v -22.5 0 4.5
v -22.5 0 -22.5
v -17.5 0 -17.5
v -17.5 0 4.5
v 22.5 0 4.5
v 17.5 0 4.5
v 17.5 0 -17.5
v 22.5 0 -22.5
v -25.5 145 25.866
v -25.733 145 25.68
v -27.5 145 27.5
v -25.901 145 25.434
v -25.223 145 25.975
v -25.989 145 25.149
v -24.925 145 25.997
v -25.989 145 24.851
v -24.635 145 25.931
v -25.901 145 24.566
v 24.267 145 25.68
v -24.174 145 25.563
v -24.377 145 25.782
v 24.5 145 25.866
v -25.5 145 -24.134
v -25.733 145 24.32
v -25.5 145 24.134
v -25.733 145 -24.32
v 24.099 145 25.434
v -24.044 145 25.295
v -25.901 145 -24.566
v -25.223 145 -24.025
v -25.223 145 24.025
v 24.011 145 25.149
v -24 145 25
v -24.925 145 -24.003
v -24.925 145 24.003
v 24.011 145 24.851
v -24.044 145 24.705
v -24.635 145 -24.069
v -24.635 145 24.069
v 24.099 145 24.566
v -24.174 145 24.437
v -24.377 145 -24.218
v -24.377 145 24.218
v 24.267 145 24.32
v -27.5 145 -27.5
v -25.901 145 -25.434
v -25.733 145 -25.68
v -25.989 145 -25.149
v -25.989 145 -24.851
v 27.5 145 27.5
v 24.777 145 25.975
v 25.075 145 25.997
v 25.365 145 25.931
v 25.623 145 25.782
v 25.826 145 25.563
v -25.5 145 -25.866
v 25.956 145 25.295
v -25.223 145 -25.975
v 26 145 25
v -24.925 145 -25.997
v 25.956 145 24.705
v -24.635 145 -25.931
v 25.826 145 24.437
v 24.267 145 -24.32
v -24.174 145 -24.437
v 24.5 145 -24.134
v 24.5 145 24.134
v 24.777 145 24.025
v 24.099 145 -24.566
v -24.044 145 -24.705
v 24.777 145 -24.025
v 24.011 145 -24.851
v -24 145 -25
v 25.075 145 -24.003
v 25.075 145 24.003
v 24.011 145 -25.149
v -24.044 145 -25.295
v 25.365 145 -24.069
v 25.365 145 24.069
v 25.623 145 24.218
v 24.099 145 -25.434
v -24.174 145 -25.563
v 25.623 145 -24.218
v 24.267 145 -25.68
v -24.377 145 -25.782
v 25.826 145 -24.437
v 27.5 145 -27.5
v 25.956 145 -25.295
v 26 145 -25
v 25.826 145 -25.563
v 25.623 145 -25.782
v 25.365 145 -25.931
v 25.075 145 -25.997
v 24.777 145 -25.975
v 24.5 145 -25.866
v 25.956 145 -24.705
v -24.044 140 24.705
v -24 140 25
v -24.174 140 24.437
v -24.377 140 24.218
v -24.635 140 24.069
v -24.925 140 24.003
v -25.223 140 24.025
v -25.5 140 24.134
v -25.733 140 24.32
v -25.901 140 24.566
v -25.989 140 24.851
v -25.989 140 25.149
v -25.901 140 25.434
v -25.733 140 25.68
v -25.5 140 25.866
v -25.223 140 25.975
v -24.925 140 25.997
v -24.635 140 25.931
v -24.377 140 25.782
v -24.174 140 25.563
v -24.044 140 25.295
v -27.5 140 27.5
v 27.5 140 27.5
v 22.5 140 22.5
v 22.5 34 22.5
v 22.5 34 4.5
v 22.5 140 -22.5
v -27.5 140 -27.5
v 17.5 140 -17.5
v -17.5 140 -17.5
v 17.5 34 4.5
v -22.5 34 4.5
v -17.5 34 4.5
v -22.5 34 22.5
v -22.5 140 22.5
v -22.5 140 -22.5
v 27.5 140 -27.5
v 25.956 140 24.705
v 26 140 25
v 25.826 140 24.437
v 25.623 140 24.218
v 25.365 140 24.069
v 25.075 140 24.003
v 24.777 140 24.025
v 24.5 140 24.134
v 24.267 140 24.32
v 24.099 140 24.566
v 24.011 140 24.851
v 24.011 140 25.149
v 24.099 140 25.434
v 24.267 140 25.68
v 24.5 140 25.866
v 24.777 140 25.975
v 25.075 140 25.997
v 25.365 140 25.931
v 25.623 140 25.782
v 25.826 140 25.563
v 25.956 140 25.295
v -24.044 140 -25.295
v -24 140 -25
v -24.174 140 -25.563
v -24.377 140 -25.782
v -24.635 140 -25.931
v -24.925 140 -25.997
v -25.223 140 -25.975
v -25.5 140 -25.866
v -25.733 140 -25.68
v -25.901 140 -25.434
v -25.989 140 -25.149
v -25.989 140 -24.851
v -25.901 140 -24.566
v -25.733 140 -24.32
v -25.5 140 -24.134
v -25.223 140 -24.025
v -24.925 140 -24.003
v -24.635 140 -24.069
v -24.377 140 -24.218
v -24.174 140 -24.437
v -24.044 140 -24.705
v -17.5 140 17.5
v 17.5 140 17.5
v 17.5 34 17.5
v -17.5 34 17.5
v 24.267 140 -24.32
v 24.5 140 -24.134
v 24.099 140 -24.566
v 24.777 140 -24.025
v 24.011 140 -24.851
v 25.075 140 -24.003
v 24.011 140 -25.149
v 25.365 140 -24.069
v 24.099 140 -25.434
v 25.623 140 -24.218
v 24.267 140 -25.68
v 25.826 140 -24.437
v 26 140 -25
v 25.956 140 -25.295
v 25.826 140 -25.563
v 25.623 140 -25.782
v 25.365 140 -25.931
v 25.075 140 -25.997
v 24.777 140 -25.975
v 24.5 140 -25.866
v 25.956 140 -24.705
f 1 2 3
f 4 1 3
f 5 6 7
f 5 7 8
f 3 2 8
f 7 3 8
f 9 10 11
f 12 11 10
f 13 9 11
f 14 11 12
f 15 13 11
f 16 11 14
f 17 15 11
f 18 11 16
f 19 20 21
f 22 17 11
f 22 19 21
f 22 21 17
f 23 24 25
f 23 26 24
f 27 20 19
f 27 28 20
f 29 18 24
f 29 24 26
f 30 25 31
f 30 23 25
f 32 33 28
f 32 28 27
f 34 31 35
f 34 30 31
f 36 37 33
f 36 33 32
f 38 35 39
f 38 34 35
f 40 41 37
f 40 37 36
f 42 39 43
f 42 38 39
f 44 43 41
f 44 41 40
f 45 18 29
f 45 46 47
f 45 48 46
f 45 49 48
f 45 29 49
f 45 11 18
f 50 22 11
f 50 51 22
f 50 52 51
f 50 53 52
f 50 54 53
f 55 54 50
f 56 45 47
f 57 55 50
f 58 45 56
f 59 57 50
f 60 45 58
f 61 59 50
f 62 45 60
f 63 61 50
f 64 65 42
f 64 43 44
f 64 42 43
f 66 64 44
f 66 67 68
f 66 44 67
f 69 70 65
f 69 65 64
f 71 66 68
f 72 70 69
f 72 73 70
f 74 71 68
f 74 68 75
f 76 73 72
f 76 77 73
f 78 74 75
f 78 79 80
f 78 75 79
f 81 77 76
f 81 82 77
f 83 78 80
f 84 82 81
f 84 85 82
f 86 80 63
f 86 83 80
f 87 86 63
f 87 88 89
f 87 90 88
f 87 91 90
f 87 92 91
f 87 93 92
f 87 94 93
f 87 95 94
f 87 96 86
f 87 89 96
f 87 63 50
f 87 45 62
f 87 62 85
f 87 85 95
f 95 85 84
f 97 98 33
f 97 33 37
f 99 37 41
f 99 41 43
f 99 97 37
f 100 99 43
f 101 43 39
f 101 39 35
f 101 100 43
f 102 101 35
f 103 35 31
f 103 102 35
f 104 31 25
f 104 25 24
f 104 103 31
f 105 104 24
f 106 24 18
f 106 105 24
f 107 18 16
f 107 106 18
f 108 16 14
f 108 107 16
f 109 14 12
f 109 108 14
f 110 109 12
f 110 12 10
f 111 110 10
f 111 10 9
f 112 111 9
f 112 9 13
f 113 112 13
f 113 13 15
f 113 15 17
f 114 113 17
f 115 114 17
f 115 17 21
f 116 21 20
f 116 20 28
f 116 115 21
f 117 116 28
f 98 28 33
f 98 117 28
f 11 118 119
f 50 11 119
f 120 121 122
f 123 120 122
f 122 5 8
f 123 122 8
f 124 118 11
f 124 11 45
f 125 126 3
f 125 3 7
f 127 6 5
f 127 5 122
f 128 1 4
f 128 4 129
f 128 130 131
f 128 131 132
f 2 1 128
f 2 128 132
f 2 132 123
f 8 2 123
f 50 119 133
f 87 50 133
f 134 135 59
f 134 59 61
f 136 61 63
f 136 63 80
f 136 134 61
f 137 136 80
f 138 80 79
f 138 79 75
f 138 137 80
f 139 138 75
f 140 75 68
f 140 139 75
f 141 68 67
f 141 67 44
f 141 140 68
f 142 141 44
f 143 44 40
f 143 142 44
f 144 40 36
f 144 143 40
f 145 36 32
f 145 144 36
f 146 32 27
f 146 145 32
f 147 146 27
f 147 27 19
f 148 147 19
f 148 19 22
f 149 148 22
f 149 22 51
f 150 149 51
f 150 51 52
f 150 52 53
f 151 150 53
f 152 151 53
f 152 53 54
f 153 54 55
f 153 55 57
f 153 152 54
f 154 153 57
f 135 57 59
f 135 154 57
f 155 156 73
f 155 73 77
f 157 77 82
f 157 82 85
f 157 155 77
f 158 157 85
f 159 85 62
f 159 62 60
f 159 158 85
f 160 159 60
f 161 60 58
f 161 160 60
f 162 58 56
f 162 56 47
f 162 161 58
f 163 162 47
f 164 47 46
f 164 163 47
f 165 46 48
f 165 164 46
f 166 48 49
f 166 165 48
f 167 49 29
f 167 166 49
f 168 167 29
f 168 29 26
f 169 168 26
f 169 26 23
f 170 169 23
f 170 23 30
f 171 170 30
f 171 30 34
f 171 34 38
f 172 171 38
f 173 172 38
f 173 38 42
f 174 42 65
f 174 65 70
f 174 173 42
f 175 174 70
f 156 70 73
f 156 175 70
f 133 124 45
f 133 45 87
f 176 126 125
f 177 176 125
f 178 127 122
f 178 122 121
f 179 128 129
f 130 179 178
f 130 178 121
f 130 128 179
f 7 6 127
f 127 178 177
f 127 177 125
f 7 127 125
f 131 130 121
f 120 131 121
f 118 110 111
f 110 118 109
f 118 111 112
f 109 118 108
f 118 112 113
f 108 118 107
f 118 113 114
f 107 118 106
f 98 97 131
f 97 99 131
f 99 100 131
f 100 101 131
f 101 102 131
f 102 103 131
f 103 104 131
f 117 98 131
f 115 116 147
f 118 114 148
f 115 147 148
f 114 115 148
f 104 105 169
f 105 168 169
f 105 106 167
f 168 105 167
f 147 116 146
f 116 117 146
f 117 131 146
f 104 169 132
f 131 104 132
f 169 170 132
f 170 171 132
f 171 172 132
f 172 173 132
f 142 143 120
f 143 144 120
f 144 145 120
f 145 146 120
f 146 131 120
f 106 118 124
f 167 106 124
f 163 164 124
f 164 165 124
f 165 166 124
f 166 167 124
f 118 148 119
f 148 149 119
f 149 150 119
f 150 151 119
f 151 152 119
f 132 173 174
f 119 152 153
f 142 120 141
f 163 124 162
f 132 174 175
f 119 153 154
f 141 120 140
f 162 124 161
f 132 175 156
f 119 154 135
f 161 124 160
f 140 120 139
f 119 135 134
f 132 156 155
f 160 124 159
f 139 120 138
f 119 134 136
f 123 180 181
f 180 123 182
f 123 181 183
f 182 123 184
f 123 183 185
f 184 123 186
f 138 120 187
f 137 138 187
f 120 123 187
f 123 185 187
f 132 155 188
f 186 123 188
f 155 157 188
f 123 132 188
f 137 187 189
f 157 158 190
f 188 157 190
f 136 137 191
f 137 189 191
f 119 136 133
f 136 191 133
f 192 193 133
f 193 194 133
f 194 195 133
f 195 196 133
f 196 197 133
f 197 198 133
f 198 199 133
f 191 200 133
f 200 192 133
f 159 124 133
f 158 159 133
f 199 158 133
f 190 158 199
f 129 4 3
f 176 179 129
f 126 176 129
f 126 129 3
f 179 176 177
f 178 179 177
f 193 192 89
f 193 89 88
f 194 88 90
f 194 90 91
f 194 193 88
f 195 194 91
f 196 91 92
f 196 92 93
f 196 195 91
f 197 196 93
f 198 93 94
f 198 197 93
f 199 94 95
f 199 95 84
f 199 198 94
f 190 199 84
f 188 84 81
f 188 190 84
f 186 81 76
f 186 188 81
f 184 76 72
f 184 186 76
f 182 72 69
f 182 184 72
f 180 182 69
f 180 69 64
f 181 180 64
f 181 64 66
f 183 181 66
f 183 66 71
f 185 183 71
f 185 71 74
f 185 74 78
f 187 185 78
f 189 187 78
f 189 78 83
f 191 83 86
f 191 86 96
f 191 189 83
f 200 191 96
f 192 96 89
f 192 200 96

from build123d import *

# Parameters (mm, degrees)
CROQUIS1_W                 = 45
CROQUIS1_H                 = 45
SALIENTE_EXTRUIR1_DEPTH    = 300
CROQUIS4_W                 = 18
CROQUIS4_H                 = 34
CORTAR_EXTRUIR2_DEPTH      = 46
CROQUIS8_W                 = 35
CROQUIS8_H                 = 35
CORTAR_EXTRUIR3_DEPTH      = 301
CROQUIS9_W                 = 35
CROQUIS9_H                 = 21.174410022
CORTAR_EXTRUIR4_DEPTH      = 10
CROQUIS10_R                = 1
CORTAR_EXTRUIR5_DEPTH      = 10
CROQUIS11_W                = 45
CROQUIS11_H                = 26.387879272
CORTAR_EXTRUIR6_DEPTH      = 46
CROQUIS13_W                = 45
CROQUIS13_H                = 133.61212073
CORTAR_EXTRUIR9_DEPTH      = 23.5
CORTAR_EXTRUIR9_DEPTH_BACK = 23.5
CROQUIS14_W                = 55
CROQUIS14_H                = 55
CROQUIS14_R                = 1
SALIENTE_EXTRUIR3_DEPTH    = 5


with BuildPart() as part:
    # Croquis1 → Saliente-Extruir1 (new body)
    with BuildSketch(Plane(origin=(0, 0, 0), x_dir=(1, 0, 0), z_dir=(0, 1, 0))):
        Rectangle(CROQUIS1_W, CROQUIS1_H)
    extrude(amount=SALIENTE_EXTRUIR1_DEPTH)

    # Croquis4 → Cortar-Extruir2 (cut, through all)
    with BuildSketch(Plane.ZY.offset(22.5)):
        with Locations((13.5, 17)):
            Rectangle(CROQUIS4_W, CROQUIS4_H)
    extrude(amount=-CORTAR_EXTRUIR2_DEPTH, mode=Mode.SUBTRACT)

    # Croquis8 → Cortar-Extruir3 (cut, through all)
    with BuildSketch(Plane(origin=(0, 300, 0), x_dir=(1, 0, 0), z_dir=(0, 1, 0))):
        Rectangle(CROQUIS8_W, CROQUIS8_H)
    extrude(amount=-CORTAR_EXTRUIR3_DEPTH, mode=Mode.SUBTRACT)

    # Croquis9 → Cortar-Extruir4 (cut)
    with BuildSketch(Plane(origin=(0, 0, -22.5), x_dir=(-1, 0, 0), z_dir=(0, 0, -1))):
        with Locations((0, 260)):
            Rectangle(CROQUIS9_W, CROQUIS9_H)
    extrude(amount=-CORTAR_EXTRUIR4_DEPTH, mode=Mode.SUBTRACT)

    # Croquis10 → Cortar-Extruir5 (cut)
    with BuildSketch(Plane.XY.offset(22.5)):
        with Locations((0, 260)):
            Circle(CROQUIS10_R)
    extrude(amount=-CORTAR_EXTRUIR5_DEPTH, mode=Mode.SUBTRACT)

    # Croquis11 → Cortar-Extruir6 (cut, through all)
    with BuildSketch(Plane.XY.offset(22.5)):
        with Locations((0, 286.806060364)):
            Rectangle(CROQUIS11_W, CROQUIS11_H)
    extrude(amount=-CORTAR_EXTRUIR6_DEPTH, mode=Mode.SUBTRACT)

    # Croquis13 → Cortar-Extruir9 (cut, two sides)
    with BuildSketch(Plane(origin=(0, 0, 0), x_dir=(0, 0, -1), z_dir=(1, 0, 0))) as cortar_extruir9_sk:
        with Locations((0, 206.806060363)):
            Rectangle(CROQUIS13_W, CROQUIS13_H)
    extrude(amount=CORTAR_EXTRUIR9_DEPTH, mode=Mode.SUBTRACT)
    extrude(cortar_extruir9_sk.sketch, amount=-CORTAR_EXTRUIR9_DEPTH_BACK, mode=Mode.SUBTRACT)

    # Croquis14 → Saliente-Extruir3 (add)
    with BuildSketch(Plane(origin=(0, 139.999999998, 0), x_dir=(1, 0, 0), z_dir=(0, 1, 0))):
        Rectangle(CROQUIS14_W, CROQUIS14_H)
        with Locations((-25, 25)):
            Circle(CROQUIS14_R, mode=Mode.SUBTRACT)
        with Locations((25, -25)):
            Circle(CROQUIS14_R, mode=Mode.SUBTRACT)
        with Locations((25, 25)):
            Circle(CROQUIS14_R, mode=Mode.SUBTRACT)
        with Locations((-25, -25)):
            Circle(CROQUIS14_R, mode=Mode.SUBTRACT)
    extrude(amount=SALIENTE_EXTRUIR3_DEPTH)


solid = part.part
